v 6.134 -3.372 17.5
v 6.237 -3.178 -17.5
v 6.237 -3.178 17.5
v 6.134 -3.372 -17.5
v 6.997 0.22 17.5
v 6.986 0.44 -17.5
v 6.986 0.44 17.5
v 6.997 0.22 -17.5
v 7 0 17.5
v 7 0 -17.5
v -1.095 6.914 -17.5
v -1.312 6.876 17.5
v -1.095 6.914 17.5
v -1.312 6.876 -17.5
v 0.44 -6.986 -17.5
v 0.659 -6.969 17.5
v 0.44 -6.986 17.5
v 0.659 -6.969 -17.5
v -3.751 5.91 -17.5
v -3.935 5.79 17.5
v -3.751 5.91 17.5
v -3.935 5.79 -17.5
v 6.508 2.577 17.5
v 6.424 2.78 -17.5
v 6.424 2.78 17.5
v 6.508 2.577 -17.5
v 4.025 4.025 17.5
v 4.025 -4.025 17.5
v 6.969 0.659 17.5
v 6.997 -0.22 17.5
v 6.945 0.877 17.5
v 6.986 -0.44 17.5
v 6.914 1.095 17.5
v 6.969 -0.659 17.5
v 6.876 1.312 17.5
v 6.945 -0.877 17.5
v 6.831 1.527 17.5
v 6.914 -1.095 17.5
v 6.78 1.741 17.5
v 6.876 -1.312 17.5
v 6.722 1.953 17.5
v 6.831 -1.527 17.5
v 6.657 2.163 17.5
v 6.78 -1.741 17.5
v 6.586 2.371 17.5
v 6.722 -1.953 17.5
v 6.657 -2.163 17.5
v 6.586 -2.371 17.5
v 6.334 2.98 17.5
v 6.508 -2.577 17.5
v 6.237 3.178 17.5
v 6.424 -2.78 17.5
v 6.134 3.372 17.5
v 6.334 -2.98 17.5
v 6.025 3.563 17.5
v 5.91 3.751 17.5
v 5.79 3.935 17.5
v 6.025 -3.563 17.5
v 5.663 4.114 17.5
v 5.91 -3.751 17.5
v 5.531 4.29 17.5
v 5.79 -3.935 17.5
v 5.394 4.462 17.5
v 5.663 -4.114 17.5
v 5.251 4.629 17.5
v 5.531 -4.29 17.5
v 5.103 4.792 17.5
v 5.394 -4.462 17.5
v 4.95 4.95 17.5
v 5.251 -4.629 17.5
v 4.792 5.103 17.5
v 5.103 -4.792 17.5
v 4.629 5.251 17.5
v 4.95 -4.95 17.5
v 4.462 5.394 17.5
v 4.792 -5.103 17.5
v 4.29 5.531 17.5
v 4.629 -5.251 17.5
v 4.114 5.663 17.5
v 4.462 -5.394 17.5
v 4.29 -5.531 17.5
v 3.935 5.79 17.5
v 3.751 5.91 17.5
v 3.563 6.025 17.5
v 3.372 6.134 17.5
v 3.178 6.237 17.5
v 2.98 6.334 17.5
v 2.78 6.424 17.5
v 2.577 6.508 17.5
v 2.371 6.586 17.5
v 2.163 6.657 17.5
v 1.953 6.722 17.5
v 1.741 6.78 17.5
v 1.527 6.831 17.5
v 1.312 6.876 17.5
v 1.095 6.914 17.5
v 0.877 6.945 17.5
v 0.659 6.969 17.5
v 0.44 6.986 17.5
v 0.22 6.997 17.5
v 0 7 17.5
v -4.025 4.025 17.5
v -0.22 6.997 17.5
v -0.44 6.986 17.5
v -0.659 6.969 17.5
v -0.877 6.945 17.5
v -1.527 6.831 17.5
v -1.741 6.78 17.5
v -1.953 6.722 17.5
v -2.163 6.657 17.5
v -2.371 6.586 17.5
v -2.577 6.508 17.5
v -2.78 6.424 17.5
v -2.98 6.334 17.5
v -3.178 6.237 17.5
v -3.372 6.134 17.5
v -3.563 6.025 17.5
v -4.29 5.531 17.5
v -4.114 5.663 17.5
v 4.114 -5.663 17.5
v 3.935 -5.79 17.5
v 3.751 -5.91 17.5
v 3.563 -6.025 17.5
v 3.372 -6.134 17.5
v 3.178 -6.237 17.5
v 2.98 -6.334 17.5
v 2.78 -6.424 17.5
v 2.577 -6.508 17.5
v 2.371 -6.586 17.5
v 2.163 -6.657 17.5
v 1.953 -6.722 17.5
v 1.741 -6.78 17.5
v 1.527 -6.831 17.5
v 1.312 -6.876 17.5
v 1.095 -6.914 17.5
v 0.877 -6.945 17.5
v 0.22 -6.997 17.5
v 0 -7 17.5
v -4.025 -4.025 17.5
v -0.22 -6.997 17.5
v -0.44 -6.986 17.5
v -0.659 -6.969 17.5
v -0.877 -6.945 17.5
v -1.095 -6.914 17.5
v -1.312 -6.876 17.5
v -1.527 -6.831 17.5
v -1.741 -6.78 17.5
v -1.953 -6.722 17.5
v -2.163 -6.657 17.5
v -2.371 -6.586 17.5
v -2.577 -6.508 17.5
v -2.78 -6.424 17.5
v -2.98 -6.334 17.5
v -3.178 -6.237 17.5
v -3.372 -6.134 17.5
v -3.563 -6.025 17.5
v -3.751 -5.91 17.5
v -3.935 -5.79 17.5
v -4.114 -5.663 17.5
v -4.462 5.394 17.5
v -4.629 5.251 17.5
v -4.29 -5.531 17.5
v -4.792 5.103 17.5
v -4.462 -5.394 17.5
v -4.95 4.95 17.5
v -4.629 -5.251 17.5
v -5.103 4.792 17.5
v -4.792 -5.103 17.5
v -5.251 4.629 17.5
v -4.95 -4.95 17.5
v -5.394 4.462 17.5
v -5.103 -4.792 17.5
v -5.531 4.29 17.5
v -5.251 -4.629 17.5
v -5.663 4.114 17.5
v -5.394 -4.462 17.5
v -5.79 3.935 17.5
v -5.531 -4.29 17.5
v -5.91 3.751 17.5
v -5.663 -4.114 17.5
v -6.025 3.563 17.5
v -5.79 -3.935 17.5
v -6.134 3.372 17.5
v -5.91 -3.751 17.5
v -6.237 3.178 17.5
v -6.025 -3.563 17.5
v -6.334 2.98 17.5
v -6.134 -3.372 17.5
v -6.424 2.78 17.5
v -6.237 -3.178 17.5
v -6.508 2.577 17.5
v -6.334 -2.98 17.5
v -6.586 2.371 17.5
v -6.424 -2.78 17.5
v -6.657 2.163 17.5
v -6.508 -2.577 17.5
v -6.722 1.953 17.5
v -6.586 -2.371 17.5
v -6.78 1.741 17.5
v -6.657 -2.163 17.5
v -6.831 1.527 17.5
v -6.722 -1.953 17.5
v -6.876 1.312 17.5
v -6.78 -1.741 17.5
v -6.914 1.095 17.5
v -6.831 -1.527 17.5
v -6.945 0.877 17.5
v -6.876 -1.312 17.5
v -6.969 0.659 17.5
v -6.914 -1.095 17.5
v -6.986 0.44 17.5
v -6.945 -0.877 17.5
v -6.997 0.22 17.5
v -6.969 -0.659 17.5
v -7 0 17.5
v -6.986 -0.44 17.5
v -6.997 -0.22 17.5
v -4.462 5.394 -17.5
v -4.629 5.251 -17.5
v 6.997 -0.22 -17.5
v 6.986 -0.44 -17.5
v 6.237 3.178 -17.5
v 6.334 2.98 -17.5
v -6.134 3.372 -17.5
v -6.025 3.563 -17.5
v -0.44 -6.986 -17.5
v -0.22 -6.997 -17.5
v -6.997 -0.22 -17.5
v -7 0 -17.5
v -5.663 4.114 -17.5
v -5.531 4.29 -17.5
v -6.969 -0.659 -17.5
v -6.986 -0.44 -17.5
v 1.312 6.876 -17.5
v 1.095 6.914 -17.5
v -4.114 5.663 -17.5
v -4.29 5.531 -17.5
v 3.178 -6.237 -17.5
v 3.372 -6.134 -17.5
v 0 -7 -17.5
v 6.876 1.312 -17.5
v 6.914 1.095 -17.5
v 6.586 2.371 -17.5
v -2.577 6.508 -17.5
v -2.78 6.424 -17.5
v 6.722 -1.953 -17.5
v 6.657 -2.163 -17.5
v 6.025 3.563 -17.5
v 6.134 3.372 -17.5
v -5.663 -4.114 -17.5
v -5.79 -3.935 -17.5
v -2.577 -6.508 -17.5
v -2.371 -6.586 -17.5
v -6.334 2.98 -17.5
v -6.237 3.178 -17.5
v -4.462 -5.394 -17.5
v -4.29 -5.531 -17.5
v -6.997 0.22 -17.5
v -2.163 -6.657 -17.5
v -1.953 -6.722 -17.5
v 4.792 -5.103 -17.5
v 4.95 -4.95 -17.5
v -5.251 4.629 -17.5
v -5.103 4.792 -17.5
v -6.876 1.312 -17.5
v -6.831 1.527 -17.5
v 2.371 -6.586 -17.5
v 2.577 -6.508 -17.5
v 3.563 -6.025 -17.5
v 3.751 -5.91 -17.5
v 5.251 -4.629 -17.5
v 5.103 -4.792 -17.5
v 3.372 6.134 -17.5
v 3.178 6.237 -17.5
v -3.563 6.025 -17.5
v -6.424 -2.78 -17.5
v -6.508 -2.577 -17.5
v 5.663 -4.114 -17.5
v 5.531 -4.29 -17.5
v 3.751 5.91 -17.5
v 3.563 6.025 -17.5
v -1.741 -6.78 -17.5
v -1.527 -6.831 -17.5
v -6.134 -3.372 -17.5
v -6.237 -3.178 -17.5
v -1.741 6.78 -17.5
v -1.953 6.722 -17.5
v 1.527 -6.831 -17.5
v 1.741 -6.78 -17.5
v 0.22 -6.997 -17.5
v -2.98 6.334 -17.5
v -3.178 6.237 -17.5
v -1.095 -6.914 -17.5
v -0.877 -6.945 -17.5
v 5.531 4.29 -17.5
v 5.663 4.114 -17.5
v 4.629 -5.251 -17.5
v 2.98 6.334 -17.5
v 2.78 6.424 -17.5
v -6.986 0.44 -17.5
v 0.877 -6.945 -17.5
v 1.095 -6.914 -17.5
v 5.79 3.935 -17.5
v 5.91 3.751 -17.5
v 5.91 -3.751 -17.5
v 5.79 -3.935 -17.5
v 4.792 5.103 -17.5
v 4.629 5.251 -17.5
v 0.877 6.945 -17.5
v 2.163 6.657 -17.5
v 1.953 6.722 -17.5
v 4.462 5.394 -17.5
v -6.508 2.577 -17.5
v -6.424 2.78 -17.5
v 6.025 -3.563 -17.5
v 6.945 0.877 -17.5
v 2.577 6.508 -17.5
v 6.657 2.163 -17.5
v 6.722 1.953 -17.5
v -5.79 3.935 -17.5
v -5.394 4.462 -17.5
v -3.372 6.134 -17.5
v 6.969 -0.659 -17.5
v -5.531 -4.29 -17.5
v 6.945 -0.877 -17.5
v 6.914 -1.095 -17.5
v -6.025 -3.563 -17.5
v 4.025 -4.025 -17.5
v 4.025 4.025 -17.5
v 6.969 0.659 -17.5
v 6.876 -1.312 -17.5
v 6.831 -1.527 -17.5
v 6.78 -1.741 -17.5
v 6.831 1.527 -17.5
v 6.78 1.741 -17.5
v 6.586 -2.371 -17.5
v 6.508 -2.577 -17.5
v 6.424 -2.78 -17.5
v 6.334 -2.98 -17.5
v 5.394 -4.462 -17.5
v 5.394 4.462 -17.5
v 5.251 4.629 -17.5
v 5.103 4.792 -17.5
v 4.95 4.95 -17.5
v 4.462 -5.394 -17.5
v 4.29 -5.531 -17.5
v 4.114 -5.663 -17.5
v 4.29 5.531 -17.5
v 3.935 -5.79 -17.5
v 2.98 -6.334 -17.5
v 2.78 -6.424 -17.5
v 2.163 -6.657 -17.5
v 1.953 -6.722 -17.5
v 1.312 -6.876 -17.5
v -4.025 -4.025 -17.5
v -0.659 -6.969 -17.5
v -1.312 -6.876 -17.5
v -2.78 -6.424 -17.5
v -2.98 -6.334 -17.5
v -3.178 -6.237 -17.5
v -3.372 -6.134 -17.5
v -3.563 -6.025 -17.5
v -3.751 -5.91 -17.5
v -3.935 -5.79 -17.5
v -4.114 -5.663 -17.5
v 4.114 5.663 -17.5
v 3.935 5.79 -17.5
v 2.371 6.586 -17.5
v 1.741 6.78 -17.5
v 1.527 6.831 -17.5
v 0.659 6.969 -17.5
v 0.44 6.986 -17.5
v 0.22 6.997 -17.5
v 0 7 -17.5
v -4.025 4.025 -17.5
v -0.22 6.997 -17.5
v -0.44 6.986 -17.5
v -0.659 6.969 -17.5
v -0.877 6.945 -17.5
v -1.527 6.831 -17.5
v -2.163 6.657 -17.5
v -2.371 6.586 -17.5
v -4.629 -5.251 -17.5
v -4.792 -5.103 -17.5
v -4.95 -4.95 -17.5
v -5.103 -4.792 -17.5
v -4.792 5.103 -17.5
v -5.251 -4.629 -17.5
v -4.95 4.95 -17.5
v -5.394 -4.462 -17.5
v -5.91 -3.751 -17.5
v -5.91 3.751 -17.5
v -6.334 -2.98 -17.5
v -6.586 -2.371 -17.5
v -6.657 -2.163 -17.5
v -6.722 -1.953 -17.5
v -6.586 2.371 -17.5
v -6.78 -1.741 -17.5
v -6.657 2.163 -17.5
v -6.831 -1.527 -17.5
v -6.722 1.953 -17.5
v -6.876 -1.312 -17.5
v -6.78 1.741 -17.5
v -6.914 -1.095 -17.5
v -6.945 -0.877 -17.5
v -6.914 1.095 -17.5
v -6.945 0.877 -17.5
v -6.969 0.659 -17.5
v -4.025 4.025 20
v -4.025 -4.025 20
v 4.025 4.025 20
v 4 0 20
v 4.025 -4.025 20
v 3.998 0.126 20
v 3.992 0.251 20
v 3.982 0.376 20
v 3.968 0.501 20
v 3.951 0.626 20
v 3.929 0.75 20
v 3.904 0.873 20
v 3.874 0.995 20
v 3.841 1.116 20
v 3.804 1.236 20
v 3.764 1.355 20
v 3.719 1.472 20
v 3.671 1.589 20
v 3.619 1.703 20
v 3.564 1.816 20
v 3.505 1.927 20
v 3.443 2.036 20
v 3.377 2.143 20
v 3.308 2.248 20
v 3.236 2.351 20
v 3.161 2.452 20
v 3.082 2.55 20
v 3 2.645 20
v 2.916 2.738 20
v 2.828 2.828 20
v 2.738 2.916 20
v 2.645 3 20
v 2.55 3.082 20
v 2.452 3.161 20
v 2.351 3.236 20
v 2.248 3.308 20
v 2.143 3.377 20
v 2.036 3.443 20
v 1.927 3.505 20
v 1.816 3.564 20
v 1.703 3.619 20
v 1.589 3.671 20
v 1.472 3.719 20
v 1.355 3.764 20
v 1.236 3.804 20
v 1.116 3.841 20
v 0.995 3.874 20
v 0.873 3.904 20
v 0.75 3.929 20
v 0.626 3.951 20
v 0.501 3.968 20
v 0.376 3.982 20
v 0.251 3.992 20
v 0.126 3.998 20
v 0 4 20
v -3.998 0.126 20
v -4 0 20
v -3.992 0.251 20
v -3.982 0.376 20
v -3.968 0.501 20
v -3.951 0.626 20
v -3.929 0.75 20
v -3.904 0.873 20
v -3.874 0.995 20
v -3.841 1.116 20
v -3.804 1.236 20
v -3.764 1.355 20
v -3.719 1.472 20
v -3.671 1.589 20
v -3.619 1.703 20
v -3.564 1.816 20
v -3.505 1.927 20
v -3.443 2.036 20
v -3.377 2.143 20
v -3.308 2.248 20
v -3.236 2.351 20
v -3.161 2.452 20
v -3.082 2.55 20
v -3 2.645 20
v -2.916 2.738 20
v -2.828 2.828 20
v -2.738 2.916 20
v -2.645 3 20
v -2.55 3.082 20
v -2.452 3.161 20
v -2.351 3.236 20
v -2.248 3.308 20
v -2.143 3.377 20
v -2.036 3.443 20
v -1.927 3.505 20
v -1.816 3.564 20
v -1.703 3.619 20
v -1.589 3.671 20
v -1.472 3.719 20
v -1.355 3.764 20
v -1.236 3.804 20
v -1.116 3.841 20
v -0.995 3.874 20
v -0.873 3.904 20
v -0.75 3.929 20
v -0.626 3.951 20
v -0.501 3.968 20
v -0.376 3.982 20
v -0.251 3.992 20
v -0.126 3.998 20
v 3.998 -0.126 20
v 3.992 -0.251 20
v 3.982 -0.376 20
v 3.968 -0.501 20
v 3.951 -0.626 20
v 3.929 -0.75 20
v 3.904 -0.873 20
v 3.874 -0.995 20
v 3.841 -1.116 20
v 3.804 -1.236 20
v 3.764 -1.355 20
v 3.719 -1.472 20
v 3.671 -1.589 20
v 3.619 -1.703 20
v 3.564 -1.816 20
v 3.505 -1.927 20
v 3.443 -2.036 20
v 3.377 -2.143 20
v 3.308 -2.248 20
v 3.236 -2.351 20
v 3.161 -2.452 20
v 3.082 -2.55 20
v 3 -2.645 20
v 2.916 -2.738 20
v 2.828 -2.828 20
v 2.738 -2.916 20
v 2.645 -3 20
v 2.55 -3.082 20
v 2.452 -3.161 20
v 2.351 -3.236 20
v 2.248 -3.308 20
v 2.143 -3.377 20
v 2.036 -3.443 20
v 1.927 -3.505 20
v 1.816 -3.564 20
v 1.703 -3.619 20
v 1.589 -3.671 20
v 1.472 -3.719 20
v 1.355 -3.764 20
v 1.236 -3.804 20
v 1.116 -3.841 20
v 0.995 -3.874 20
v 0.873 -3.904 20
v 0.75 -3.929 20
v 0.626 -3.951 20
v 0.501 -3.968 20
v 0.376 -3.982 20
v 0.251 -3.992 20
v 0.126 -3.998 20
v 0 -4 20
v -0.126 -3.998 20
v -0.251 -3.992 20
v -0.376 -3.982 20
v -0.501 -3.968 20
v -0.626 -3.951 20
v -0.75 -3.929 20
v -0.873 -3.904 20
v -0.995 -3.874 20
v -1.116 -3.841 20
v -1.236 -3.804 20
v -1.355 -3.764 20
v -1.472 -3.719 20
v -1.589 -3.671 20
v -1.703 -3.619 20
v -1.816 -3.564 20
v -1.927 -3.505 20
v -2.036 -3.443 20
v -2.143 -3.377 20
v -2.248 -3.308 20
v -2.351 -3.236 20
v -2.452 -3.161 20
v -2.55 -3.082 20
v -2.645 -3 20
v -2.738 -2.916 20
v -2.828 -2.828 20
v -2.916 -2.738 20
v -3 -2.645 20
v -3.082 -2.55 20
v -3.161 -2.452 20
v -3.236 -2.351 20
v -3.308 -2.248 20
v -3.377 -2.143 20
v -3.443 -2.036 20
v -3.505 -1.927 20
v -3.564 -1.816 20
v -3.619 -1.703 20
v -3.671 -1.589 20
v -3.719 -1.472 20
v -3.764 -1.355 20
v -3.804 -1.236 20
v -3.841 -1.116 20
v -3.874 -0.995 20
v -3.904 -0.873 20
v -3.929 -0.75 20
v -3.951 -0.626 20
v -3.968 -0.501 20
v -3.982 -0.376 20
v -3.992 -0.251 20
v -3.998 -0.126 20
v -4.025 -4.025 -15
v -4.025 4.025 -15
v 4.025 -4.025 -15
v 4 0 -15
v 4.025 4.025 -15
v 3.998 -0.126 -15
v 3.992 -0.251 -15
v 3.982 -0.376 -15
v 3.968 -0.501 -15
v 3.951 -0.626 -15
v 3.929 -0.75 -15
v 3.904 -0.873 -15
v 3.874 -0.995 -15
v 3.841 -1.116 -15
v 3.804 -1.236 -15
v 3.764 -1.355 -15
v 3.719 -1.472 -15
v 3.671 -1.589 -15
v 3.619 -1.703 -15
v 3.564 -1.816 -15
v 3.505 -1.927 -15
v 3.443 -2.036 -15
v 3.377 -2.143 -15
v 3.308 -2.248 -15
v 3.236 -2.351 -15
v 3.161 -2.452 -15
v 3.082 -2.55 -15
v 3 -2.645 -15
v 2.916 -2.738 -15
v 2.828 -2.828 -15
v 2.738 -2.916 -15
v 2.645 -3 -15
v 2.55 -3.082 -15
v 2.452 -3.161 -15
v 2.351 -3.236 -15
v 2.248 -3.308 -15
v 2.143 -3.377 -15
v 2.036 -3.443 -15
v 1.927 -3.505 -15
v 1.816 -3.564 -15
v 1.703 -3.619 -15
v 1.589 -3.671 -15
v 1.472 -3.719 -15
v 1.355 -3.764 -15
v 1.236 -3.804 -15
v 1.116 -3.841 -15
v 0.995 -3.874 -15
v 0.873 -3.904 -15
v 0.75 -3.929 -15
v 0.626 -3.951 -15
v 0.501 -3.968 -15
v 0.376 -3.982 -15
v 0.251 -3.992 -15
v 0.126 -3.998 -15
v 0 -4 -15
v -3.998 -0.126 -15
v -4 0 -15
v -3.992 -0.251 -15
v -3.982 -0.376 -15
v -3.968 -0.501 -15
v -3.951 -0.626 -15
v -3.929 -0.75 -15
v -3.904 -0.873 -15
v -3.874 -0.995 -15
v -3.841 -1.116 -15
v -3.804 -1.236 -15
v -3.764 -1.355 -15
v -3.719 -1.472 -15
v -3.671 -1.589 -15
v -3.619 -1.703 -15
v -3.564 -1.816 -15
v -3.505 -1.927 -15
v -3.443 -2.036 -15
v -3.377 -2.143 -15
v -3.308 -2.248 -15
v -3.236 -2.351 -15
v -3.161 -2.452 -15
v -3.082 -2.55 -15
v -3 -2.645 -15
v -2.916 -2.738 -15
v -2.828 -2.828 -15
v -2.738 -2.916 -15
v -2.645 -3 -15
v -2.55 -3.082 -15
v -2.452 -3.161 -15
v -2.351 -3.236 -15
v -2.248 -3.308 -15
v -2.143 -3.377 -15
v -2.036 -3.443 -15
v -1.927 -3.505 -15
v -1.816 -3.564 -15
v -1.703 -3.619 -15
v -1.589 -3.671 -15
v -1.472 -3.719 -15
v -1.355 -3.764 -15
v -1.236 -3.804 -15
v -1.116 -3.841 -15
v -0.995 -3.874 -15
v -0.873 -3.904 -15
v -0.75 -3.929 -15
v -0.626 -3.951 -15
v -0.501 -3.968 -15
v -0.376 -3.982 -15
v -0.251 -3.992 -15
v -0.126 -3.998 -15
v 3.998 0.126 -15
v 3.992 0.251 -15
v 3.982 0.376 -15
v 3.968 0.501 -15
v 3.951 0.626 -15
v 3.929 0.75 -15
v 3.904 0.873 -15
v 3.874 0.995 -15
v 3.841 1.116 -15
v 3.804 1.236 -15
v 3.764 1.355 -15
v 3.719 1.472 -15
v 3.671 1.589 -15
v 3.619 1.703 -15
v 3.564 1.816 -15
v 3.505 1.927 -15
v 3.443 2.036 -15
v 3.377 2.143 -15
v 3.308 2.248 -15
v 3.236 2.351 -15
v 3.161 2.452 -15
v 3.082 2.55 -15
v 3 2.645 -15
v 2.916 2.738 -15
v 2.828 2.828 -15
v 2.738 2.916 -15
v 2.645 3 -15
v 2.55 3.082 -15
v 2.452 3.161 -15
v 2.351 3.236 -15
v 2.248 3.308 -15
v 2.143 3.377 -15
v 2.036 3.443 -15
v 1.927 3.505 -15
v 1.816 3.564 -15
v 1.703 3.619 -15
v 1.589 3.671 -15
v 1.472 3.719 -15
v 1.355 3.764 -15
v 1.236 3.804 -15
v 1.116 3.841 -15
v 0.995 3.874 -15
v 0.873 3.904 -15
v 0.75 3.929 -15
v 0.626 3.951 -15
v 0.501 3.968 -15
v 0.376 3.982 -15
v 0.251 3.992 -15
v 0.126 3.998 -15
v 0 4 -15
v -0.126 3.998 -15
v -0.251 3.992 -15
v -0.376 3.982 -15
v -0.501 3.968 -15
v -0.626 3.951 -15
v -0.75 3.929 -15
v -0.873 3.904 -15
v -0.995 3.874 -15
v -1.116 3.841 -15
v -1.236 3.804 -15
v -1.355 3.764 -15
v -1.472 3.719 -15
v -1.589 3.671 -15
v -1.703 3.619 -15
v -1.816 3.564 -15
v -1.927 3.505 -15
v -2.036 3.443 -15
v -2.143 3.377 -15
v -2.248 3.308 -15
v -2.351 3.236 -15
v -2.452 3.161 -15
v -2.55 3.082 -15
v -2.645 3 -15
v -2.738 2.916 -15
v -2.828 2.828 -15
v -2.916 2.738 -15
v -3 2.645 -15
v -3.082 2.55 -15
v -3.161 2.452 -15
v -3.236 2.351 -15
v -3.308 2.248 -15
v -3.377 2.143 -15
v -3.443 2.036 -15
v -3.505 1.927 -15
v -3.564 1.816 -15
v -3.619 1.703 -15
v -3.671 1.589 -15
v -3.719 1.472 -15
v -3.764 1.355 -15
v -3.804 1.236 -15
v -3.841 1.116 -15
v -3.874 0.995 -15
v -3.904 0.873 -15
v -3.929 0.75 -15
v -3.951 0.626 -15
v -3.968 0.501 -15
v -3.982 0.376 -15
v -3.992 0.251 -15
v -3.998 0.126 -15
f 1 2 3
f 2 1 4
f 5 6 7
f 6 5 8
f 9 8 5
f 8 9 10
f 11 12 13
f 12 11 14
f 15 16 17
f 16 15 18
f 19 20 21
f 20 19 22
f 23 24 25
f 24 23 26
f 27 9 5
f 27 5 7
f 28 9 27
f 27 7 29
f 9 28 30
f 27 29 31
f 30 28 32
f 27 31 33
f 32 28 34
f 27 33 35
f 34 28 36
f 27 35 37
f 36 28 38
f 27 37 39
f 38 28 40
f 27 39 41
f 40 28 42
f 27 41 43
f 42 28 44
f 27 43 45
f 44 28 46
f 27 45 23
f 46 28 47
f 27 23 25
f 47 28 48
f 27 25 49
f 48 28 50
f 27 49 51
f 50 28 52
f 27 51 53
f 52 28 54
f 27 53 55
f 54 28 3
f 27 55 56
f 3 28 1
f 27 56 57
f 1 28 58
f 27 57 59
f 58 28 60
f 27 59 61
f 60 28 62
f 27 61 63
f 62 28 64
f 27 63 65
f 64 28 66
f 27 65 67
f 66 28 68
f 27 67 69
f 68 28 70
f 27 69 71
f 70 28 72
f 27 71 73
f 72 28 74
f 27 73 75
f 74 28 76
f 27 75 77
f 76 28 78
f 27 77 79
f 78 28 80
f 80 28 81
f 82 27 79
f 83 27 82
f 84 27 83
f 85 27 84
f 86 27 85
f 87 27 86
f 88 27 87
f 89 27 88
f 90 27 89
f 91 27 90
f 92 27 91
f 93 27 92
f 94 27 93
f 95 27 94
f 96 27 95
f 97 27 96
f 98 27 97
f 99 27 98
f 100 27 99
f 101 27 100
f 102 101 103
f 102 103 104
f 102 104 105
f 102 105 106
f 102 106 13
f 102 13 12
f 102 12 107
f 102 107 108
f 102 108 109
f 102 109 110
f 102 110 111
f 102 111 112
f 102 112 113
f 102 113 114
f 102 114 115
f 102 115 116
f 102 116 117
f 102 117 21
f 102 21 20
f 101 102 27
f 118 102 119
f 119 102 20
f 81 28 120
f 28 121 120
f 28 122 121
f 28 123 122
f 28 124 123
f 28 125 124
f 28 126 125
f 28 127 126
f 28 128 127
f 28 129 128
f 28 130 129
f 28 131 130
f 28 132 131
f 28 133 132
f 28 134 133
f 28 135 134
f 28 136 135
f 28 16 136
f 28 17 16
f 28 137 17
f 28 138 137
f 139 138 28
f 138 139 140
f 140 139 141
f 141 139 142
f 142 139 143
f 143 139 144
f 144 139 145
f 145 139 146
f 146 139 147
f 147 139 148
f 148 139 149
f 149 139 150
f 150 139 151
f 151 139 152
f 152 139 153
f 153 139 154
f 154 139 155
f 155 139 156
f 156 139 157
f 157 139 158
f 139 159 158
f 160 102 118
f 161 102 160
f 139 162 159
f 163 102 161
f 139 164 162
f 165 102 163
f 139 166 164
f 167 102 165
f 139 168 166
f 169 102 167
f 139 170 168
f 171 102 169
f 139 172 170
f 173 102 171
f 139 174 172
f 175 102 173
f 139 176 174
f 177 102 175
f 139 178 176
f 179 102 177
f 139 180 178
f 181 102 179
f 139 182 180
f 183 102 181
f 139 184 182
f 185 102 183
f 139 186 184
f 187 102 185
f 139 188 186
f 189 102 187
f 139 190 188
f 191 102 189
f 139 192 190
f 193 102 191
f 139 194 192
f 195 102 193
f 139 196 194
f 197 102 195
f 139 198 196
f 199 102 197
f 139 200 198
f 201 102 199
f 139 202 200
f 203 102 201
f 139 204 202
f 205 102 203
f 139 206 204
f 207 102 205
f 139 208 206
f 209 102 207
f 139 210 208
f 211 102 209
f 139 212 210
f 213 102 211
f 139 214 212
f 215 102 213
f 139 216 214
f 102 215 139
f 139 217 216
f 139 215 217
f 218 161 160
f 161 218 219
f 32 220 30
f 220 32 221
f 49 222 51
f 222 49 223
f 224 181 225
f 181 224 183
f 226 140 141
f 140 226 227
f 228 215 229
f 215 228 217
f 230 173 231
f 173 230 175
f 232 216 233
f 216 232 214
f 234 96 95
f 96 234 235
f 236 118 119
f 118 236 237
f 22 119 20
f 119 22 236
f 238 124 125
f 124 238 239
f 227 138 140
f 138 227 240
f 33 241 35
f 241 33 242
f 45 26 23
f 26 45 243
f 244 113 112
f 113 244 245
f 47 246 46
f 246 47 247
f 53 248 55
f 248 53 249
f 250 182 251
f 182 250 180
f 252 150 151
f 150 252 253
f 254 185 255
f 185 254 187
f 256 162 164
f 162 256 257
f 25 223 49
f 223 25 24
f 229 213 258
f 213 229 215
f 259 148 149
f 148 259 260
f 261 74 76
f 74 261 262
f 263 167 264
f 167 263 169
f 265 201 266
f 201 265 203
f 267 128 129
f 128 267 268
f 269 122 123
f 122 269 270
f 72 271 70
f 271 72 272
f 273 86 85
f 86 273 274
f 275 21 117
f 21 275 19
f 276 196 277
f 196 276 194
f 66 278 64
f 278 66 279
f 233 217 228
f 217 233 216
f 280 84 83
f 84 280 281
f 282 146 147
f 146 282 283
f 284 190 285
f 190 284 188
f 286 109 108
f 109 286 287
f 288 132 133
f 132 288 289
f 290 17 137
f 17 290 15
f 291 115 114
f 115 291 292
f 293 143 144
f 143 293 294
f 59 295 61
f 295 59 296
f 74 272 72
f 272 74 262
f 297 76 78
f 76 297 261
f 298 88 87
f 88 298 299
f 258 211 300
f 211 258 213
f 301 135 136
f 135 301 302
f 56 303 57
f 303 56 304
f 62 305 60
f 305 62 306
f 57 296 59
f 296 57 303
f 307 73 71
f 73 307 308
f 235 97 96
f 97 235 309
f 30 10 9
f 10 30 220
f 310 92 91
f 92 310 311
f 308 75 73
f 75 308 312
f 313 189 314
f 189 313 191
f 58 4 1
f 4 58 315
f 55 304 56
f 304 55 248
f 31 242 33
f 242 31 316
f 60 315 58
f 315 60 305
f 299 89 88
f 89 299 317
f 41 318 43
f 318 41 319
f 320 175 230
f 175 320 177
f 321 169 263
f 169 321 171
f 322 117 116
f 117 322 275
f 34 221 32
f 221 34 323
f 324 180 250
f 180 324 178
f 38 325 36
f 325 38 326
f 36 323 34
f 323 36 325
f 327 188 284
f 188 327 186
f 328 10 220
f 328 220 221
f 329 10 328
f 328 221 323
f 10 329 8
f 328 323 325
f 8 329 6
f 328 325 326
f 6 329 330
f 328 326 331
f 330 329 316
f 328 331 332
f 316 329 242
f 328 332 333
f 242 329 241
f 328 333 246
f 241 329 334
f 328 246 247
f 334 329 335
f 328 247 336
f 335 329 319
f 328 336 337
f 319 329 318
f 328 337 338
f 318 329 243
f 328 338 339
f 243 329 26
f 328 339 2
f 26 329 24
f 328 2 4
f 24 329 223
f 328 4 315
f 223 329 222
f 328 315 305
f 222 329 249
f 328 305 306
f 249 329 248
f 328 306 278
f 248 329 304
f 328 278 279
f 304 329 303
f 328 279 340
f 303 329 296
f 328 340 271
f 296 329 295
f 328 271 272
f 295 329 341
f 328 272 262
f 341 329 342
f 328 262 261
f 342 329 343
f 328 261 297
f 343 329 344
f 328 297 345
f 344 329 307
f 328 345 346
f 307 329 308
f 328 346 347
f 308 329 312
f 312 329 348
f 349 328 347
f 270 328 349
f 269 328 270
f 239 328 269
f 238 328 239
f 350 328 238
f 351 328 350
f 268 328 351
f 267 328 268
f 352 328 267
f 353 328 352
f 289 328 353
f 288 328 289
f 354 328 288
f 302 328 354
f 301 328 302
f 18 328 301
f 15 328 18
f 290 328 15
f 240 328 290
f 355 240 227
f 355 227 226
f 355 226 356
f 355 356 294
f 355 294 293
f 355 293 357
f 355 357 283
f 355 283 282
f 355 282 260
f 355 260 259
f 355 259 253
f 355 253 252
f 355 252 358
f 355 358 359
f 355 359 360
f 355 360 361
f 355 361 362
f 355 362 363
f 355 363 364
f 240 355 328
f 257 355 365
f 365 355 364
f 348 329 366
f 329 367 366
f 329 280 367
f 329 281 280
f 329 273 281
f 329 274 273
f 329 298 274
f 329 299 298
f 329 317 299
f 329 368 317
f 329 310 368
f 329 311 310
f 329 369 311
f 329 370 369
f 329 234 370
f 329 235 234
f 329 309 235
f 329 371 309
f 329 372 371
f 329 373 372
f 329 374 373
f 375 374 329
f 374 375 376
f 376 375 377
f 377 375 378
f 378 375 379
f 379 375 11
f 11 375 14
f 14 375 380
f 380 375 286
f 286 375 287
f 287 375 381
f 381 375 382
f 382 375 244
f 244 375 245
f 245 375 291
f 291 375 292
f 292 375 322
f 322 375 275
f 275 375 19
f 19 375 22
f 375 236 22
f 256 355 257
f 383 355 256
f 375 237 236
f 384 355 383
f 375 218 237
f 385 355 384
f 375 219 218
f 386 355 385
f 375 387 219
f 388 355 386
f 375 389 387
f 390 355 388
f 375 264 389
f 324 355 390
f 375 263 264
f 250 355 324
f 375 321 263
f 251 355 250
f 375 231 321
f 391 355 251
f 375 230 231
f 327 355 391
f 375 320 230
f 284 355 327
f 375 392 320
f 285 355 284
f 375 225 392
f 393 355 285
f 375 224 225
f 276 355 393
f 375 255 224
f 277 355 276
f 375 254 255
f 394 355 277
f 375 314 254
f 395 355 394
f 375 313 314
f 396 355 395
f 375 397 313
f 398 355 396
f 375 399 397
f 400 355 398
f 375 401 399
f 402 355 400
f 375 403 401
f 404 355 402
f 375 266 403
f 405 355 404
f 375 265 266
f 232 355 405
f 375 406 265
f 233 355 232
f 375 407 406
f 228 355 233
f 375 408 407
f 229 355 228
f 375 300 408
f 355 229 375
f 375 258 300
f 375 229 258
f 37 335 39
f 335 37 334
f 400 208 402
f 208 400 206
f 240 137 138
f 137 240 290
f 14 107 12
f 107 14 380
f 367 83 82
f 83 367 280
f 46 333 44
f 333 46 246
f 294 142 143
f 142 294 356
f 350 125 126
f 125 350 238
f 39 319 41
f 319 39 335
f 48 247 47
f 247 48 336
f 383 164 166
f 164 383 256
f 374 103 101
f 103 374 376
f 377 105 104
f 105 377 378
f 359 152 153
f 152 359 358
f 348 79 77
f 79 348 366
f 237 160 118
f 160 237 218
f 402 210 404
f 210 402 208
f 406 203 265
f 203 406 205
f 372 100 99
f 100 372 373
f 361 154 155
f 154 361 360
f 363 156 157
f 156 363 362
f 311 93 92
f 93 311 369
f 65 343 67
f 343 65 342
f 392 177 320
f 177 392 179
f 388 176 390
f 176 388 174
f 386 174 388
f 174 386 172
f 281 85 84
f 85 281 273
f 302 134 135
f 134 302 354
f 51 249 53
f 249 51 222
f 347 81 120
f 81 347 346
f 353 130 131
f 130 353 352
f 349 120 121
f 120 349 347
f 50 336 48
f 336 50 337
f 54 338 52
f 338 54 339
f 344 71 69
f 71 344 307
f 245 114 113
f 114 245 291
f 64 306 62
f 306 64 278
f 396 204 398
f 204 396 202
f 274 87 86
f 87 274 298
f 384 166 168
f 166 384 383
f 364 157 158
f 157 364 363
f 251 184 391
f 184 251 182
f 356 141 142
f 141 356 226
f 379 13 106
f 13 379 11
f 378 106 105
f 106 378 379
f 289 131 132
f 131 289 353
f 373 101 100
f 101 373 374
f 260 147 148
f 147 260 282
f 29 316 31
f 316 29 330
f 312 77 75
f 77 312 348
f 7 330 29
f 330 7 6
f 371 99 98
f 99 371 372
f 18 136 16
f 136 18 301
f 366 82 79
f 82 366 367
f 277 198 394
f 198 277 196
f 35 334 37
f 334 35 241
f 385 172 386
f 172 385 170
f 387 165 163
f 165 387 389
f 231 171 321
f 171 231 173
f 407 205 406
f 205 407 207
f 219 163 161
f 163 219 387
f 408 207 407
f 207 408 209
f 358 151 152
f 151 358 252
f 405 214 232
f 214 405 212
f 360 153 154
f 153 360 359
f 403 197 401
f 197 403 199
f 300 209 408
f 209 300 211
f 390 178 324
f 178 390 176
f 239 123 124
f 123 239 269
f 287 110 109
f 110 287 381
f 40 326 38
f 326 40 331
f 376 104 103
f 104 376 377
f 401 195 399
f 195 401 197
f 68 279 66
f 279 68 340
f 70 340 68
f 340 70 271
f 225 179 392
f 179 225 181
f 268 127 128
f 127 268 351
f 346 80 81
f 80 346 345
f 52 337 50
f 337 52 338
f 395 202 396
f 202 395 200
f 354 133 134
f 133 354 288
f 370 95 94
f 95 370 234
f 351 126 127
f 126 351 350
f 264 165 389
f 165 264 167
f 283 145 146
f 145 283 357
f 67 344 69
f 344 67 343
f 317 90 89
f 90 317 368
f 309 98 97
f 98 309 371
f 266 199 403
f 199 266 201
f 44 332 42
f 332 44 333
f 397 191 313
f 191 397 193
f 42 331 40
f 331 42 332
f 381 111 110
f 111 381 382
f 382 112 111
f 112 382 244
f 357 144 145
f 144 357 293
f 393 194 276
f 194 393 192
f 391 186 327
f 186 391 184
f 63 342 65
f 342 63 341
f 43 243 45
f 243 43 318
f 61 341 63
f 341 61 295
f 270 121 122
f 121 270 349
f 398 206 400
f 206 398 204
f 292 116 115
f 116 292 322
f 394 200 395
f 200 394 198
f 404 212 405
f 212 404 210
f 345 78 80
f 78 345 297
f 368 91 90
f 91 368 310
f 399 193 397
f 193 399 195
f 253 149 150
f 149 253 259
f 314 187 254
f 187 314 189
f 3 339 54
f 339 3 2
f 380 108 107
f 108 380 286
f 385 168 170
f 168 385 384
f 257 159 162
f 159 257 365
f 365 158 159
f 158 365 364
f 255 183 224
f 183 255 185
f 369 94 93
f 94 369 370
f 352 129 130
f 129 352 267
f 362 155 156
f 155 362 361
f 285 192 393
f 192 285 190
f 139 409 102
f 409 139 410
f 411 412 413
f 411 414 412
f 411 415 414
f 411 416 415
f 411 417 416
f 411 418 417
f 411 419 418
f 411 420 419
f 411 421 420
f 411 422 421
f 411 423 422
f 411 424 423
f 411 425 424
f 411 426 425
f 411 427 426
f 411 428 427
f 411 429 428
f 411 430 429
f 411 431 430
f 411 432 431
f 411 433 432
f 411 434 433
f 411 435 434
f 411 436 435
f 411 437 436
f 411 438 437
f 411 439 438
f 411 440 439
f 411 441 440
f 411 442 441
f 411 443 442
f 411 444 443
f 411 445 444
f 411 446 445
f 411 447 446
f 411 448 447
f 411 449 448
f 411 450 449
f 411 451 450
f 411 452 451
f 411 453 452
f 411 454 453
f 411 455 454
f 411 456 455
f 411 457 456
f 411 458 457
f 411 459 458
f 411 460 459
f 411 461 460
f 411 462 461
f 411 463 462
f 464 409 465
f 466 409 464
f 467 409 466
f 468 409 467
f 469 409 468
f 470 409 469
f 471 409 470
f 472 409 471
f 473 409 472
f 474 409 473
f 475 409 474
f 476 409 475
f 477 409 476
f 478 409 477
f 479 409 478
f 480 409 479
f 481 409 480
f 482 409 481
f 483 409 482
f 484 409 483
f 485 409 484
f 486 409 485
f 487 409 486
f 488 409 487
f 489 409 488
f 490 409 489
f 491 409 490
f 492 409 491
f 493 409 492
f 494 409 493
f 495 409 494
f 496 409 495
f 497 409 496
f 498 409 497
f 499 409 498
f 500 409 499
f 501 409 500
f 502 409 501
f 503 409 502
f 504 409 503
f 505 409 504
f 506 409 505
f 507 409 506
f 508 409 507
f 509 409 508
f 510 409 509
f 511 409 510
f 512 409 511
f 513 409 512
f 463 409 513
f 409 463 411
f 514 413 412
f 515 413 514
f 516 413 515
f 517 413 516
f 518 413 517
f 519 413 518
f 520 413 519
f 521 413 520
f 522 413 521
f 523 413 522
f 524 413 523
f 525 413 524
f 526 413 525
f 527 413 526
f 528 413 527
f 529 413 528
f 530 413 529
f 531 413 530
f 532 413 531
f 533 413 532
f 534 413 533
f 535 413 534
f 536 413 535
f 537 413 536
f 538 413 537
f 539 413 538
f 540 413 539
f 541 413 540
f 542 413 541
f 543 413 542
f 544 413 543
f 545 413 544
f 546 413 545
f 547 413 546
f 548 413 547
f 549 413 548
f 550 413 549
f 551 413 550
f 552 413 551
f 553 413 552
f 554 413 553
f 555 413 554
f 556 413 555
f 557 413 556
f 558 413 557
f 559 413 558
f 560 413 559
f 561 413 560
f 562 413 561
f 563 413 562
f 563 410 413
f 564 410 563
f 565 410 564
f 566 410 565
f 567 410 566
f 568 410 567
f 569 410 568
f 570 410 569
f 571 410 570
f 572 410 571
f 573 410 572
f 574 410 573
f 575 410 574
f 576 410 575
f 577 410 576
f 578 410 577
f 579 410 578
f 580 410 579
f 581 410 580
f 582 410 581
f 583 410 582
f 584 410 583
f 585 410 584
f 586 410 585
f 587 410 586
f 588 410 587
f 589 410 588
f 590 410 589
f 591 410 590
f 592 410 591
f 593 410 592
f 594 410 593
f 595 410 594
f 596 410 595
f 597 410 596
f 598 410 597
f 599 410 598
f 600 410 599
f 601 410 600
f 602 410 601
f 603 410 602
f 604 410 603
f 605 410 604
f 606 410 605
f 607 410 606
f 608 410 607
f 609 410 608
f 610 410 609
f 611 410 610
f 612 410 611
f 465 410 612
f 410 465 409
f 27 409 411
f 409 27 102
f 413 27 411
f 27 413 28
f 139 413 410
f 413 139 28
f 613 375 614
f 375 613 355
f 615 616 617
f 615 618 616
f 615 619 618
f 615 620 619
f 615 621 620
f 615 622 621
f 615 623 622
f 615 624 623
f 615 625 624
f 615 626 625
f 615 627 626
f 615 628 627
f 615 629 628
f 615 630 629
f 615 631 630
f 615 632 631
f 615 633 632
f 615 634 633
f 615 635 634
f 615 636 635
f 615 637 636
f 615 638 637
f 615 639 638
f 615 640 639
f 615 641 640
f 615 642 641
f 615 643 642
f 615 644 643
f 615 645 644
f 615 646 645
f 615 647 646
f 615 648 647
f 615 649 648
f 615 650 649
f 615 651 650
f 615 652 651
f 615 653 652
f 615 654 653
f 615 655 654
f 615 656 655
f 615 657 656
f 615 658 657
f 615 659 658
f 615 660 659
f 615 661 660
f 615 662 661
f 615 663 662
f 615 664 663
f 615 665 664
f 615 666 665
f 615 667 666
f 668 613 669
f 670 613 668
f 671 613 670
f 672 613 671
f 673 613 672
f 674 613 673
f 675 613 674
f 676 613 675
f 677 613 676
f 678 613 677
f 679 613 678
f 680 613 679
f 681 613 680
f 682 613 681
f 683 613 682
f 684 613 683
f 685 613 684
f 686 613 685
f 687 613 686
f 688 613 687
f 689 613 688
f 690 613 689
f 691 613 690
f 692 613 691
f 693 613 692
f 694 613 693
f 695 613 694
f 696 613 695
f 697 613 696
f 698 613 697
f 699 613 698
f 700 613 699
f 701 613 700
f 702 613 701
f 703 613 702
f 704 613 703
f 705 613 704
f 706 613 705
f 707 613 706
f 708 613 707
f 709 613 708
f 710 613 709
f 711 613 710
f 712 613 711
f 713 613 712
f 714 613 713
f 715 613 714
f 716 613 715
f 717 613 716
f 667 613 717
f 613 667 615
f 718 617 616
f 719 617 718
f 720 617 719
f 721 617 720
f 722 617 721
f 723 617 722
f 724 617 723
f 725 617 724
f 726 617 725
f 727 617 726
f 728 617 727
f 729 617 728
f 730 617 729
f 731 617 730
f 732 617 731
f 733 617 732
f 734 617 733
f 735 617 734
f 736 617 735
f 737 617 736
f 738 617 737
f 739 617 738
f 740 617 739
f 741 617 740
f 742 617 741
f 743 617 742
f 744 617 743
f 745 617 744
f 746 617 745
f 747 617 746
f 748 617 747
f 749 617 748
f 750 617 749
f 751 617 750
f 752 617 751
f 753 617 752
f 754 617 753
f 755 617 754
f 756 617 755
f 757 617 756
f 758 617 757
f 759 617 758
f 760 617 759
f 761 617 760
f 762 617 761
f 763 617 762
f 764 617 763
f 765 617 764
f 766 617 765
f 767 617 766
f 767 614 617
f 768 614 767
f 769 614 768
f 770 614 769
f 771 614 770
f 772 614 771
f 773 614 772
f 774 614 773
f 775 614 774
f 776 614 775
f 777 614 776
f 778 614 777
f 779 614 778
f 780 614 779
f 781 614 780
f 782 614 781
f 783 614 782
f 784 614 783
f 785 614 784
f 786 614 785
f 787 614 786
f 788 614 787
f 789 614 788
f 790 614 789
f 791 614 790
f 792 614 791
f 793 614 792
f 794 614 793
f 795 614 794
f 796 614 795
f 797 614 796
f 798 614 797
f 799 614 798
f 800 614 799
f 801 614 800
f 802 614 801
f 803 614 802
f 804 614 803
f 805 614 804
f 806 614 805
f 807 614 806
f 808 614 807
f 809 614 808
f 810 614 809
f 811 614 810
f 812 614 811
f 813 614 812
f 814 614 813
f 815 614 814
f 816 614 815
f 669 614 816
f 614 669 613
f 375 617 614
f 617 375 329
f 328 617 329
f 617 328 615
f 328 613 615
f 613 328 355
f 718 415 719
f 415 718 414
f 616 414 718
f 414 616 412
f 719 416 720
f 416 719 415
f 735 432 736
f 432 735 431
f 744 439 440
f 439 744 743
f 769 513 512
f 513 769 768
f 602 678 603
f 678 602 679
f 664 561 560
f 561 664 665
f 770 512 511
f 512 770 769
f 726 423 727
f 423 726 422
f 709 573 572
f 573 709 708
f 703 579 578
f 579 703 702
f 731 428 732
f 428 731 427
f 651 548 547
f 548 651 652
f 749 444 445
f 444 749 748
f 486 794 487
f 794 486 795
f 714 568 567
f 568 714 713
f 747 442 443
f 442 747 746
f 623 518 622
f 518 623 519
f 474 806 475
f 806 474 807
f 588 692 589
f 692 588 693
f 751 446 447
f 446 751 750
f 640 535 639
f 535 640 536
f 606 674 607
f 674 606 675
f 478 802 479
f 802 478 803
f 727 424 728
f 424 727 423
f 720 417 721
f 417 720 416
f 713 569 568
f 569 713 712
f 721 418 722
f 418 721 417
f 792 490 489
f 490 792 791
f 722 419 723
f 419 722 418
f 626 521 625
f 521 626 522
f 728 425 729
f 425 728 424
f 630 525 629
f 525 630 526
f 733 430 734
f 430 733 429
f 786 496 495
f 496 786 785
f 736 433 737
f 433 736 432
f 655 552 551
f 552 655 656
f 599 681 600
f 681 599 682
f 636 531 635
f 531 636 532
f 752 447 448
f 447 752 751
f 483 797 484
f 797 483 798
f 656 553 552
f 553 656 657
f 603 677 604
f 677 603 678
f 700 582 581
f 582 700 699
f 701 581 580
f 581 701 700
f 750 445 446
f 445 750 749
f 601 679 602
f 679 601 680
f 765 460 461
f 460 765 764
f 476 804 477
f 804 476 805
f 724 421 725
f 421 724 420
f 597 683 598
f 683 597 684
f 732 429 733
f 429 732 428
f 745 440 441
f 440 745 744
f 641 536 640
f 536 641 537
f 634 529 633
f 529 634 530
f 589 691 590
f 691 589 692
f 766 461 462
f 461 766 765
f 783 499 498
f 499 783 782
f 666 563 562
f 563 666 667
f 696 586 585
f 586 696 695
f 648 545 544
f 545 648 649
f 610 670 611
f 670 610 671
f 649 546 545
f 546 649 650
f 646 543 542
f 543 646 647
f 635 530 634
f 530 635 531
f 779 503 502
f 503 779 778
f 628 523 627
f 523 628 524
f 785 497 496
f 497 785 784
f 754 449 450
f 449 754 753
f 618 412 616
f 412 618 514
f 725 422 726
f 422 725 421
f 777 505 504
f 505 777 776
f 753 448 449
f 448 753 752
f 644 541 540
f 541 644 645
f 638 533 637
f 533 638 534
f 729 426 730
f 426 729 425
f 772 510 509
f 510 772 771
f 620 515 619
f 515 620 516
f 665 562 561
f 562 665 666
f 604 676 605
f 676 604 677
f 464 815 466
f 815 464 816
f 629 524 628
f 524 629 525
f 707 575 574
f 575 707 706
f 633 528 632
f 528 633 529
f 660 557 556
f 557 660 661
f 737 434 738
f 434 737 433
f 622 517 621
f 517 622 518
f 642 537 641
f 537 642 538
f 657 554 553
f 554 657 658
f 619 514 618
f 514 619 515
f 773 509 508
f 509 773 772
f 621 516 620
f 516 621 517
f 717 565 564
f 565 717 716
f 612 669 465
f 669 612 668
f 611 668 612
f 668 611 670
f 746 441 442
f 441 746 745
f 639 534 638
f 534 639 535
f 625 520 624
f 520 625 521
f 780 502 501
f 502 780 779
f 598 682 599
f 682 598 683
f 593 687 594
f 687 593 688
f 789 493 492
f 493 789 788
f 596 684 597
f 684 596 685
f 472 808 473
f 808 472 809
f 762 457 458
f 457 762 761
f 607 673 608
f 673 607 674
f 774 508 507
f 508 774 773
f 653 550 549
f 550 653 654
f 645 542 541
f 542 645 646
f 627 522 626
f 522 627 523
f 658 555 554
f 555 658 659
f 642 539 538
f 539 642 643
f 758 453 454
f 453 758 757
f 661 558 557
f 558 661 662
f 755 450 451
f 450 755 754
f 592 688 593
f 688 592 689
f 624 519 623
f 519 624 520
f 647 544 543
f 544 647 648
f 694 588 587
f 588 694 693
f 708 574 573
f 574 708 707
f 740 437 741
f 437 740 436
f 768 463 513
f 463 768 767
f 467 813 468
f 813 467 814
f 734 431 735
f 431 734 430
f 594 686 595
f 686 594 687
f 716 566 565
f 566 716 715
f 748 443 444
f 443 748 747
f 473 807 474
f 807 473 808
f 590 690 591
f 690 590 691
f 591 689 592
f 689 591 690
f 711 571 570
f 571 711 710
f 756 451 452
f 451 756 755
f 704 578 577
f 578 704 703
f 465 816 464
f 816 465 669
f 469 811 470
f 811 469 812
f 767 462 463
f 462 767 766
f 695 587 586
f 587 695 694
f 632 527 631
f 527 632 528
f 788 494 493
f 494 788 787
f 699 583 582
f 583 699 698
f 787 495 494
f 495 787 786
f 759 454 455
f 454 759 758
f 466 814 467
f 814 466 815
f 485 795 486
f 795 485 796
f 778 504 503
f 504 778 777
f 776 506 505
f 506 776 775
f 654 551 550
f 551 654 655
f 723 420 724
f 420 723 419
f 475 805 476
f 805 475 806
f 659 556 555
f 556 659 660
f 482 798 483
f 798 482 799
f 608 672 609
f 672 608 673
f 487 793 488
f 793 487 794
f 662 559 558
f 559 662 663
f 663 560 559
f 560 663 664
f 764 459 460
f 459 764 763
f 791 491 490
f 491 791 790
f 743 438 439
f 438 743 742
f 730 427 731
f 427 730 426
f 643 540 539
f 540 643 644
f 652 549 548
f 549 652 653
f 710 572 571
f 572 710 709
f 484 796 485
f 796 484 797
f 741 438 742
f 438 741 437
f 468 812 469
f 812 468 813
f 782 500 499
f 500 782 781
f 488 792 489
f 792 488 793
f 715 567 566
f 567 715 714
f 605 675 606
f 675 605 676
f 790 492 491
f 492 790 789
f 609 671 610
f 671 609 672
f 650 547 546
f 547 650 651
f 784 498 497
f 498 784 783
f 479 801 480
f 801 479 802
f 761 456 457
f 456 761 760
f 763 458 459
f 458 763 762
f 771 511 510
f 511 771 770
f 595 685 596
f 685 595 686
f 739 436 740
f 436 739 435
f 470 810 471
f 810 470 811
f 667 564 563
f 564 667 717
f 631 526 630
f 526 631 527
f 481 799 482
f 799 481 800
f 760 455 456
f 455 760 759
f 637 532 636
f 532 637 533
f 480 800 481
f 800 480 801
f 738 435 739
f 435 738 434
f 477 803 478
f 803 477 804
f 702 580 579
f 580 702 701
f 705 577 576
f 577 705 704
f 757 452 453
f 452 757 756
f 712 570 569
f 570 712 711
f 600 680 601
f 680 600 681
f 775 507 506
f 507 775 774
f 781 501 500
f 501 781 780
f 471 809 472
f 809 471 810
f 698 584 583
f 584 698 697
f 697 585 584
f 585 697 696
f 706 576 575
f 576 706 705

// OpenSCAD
/// DistoX2 calibration handle v.2 enlagrer by Mykyta Kozlov

sn=100; // subdivision for cylinders

module key() {
  linear_extrude(height = 2.5, center = false, convexity = 10, twist = 0)
  square(8.05,true);
}

difference() {
  difference() {
    union() {
      cylinder(h=35, d1=14, d2=14, center=true, $fn=2*sn);
      translate([0,0,17.5]) key();
    }
    translate([0,0,-17.5]) key();
  }
  cylinder(h=42, d1=8, d2=8, center=true, $fn=2*sn);
}
